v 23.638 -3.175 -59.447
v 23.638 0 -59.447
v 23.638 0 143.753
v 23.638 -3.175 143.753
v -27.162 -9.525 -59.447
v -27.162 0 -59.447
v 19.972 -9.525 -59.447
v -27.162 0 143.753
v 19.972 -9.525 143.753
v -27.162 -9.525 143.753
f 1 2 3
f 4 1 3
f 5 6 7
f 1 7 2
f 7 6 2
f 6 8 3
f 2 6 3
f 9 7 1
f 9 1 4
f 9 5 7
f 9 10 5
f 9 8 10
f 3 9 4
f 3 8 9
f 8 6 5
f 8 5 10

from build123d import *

# Parameters (mm, degrees)
F0_W     = 50.8
F0_H     = 203.2
F1_DEPTH = 9.525
F2_SIZE2 = 3.6661742094
F2_SIZE  = 6.35


# Not quite as in the source:
# - a length typed as a fraction of an inch, garbled in the dataset ("3 / 203.2 mm" for 3/8 in), is restored


with BuildPart() as f1:
    # F0 (on Front) → F1 (new body)
    with BuildSketch(Plane.XZ):
        with Locations((-1.7615184188, 42.1527517154)):
            Rectangle(F0_W, F0_H)
    extrude(amount=F1_DEPTH)

    # F2
    f2_edges = [f1.edges().sort_by_distance(p)[0] for p in [
        (23.638482, -9.525, 42.152752),
    ]]
    f2_side = f1.faces().sort_by_distance((23.638482, -4.7625, 42.152752))[0]
    chamfer(f2_edges, length=F2_SIZE, length2=F2_SIZE2, reference=f2_side)


solid = f1.part
